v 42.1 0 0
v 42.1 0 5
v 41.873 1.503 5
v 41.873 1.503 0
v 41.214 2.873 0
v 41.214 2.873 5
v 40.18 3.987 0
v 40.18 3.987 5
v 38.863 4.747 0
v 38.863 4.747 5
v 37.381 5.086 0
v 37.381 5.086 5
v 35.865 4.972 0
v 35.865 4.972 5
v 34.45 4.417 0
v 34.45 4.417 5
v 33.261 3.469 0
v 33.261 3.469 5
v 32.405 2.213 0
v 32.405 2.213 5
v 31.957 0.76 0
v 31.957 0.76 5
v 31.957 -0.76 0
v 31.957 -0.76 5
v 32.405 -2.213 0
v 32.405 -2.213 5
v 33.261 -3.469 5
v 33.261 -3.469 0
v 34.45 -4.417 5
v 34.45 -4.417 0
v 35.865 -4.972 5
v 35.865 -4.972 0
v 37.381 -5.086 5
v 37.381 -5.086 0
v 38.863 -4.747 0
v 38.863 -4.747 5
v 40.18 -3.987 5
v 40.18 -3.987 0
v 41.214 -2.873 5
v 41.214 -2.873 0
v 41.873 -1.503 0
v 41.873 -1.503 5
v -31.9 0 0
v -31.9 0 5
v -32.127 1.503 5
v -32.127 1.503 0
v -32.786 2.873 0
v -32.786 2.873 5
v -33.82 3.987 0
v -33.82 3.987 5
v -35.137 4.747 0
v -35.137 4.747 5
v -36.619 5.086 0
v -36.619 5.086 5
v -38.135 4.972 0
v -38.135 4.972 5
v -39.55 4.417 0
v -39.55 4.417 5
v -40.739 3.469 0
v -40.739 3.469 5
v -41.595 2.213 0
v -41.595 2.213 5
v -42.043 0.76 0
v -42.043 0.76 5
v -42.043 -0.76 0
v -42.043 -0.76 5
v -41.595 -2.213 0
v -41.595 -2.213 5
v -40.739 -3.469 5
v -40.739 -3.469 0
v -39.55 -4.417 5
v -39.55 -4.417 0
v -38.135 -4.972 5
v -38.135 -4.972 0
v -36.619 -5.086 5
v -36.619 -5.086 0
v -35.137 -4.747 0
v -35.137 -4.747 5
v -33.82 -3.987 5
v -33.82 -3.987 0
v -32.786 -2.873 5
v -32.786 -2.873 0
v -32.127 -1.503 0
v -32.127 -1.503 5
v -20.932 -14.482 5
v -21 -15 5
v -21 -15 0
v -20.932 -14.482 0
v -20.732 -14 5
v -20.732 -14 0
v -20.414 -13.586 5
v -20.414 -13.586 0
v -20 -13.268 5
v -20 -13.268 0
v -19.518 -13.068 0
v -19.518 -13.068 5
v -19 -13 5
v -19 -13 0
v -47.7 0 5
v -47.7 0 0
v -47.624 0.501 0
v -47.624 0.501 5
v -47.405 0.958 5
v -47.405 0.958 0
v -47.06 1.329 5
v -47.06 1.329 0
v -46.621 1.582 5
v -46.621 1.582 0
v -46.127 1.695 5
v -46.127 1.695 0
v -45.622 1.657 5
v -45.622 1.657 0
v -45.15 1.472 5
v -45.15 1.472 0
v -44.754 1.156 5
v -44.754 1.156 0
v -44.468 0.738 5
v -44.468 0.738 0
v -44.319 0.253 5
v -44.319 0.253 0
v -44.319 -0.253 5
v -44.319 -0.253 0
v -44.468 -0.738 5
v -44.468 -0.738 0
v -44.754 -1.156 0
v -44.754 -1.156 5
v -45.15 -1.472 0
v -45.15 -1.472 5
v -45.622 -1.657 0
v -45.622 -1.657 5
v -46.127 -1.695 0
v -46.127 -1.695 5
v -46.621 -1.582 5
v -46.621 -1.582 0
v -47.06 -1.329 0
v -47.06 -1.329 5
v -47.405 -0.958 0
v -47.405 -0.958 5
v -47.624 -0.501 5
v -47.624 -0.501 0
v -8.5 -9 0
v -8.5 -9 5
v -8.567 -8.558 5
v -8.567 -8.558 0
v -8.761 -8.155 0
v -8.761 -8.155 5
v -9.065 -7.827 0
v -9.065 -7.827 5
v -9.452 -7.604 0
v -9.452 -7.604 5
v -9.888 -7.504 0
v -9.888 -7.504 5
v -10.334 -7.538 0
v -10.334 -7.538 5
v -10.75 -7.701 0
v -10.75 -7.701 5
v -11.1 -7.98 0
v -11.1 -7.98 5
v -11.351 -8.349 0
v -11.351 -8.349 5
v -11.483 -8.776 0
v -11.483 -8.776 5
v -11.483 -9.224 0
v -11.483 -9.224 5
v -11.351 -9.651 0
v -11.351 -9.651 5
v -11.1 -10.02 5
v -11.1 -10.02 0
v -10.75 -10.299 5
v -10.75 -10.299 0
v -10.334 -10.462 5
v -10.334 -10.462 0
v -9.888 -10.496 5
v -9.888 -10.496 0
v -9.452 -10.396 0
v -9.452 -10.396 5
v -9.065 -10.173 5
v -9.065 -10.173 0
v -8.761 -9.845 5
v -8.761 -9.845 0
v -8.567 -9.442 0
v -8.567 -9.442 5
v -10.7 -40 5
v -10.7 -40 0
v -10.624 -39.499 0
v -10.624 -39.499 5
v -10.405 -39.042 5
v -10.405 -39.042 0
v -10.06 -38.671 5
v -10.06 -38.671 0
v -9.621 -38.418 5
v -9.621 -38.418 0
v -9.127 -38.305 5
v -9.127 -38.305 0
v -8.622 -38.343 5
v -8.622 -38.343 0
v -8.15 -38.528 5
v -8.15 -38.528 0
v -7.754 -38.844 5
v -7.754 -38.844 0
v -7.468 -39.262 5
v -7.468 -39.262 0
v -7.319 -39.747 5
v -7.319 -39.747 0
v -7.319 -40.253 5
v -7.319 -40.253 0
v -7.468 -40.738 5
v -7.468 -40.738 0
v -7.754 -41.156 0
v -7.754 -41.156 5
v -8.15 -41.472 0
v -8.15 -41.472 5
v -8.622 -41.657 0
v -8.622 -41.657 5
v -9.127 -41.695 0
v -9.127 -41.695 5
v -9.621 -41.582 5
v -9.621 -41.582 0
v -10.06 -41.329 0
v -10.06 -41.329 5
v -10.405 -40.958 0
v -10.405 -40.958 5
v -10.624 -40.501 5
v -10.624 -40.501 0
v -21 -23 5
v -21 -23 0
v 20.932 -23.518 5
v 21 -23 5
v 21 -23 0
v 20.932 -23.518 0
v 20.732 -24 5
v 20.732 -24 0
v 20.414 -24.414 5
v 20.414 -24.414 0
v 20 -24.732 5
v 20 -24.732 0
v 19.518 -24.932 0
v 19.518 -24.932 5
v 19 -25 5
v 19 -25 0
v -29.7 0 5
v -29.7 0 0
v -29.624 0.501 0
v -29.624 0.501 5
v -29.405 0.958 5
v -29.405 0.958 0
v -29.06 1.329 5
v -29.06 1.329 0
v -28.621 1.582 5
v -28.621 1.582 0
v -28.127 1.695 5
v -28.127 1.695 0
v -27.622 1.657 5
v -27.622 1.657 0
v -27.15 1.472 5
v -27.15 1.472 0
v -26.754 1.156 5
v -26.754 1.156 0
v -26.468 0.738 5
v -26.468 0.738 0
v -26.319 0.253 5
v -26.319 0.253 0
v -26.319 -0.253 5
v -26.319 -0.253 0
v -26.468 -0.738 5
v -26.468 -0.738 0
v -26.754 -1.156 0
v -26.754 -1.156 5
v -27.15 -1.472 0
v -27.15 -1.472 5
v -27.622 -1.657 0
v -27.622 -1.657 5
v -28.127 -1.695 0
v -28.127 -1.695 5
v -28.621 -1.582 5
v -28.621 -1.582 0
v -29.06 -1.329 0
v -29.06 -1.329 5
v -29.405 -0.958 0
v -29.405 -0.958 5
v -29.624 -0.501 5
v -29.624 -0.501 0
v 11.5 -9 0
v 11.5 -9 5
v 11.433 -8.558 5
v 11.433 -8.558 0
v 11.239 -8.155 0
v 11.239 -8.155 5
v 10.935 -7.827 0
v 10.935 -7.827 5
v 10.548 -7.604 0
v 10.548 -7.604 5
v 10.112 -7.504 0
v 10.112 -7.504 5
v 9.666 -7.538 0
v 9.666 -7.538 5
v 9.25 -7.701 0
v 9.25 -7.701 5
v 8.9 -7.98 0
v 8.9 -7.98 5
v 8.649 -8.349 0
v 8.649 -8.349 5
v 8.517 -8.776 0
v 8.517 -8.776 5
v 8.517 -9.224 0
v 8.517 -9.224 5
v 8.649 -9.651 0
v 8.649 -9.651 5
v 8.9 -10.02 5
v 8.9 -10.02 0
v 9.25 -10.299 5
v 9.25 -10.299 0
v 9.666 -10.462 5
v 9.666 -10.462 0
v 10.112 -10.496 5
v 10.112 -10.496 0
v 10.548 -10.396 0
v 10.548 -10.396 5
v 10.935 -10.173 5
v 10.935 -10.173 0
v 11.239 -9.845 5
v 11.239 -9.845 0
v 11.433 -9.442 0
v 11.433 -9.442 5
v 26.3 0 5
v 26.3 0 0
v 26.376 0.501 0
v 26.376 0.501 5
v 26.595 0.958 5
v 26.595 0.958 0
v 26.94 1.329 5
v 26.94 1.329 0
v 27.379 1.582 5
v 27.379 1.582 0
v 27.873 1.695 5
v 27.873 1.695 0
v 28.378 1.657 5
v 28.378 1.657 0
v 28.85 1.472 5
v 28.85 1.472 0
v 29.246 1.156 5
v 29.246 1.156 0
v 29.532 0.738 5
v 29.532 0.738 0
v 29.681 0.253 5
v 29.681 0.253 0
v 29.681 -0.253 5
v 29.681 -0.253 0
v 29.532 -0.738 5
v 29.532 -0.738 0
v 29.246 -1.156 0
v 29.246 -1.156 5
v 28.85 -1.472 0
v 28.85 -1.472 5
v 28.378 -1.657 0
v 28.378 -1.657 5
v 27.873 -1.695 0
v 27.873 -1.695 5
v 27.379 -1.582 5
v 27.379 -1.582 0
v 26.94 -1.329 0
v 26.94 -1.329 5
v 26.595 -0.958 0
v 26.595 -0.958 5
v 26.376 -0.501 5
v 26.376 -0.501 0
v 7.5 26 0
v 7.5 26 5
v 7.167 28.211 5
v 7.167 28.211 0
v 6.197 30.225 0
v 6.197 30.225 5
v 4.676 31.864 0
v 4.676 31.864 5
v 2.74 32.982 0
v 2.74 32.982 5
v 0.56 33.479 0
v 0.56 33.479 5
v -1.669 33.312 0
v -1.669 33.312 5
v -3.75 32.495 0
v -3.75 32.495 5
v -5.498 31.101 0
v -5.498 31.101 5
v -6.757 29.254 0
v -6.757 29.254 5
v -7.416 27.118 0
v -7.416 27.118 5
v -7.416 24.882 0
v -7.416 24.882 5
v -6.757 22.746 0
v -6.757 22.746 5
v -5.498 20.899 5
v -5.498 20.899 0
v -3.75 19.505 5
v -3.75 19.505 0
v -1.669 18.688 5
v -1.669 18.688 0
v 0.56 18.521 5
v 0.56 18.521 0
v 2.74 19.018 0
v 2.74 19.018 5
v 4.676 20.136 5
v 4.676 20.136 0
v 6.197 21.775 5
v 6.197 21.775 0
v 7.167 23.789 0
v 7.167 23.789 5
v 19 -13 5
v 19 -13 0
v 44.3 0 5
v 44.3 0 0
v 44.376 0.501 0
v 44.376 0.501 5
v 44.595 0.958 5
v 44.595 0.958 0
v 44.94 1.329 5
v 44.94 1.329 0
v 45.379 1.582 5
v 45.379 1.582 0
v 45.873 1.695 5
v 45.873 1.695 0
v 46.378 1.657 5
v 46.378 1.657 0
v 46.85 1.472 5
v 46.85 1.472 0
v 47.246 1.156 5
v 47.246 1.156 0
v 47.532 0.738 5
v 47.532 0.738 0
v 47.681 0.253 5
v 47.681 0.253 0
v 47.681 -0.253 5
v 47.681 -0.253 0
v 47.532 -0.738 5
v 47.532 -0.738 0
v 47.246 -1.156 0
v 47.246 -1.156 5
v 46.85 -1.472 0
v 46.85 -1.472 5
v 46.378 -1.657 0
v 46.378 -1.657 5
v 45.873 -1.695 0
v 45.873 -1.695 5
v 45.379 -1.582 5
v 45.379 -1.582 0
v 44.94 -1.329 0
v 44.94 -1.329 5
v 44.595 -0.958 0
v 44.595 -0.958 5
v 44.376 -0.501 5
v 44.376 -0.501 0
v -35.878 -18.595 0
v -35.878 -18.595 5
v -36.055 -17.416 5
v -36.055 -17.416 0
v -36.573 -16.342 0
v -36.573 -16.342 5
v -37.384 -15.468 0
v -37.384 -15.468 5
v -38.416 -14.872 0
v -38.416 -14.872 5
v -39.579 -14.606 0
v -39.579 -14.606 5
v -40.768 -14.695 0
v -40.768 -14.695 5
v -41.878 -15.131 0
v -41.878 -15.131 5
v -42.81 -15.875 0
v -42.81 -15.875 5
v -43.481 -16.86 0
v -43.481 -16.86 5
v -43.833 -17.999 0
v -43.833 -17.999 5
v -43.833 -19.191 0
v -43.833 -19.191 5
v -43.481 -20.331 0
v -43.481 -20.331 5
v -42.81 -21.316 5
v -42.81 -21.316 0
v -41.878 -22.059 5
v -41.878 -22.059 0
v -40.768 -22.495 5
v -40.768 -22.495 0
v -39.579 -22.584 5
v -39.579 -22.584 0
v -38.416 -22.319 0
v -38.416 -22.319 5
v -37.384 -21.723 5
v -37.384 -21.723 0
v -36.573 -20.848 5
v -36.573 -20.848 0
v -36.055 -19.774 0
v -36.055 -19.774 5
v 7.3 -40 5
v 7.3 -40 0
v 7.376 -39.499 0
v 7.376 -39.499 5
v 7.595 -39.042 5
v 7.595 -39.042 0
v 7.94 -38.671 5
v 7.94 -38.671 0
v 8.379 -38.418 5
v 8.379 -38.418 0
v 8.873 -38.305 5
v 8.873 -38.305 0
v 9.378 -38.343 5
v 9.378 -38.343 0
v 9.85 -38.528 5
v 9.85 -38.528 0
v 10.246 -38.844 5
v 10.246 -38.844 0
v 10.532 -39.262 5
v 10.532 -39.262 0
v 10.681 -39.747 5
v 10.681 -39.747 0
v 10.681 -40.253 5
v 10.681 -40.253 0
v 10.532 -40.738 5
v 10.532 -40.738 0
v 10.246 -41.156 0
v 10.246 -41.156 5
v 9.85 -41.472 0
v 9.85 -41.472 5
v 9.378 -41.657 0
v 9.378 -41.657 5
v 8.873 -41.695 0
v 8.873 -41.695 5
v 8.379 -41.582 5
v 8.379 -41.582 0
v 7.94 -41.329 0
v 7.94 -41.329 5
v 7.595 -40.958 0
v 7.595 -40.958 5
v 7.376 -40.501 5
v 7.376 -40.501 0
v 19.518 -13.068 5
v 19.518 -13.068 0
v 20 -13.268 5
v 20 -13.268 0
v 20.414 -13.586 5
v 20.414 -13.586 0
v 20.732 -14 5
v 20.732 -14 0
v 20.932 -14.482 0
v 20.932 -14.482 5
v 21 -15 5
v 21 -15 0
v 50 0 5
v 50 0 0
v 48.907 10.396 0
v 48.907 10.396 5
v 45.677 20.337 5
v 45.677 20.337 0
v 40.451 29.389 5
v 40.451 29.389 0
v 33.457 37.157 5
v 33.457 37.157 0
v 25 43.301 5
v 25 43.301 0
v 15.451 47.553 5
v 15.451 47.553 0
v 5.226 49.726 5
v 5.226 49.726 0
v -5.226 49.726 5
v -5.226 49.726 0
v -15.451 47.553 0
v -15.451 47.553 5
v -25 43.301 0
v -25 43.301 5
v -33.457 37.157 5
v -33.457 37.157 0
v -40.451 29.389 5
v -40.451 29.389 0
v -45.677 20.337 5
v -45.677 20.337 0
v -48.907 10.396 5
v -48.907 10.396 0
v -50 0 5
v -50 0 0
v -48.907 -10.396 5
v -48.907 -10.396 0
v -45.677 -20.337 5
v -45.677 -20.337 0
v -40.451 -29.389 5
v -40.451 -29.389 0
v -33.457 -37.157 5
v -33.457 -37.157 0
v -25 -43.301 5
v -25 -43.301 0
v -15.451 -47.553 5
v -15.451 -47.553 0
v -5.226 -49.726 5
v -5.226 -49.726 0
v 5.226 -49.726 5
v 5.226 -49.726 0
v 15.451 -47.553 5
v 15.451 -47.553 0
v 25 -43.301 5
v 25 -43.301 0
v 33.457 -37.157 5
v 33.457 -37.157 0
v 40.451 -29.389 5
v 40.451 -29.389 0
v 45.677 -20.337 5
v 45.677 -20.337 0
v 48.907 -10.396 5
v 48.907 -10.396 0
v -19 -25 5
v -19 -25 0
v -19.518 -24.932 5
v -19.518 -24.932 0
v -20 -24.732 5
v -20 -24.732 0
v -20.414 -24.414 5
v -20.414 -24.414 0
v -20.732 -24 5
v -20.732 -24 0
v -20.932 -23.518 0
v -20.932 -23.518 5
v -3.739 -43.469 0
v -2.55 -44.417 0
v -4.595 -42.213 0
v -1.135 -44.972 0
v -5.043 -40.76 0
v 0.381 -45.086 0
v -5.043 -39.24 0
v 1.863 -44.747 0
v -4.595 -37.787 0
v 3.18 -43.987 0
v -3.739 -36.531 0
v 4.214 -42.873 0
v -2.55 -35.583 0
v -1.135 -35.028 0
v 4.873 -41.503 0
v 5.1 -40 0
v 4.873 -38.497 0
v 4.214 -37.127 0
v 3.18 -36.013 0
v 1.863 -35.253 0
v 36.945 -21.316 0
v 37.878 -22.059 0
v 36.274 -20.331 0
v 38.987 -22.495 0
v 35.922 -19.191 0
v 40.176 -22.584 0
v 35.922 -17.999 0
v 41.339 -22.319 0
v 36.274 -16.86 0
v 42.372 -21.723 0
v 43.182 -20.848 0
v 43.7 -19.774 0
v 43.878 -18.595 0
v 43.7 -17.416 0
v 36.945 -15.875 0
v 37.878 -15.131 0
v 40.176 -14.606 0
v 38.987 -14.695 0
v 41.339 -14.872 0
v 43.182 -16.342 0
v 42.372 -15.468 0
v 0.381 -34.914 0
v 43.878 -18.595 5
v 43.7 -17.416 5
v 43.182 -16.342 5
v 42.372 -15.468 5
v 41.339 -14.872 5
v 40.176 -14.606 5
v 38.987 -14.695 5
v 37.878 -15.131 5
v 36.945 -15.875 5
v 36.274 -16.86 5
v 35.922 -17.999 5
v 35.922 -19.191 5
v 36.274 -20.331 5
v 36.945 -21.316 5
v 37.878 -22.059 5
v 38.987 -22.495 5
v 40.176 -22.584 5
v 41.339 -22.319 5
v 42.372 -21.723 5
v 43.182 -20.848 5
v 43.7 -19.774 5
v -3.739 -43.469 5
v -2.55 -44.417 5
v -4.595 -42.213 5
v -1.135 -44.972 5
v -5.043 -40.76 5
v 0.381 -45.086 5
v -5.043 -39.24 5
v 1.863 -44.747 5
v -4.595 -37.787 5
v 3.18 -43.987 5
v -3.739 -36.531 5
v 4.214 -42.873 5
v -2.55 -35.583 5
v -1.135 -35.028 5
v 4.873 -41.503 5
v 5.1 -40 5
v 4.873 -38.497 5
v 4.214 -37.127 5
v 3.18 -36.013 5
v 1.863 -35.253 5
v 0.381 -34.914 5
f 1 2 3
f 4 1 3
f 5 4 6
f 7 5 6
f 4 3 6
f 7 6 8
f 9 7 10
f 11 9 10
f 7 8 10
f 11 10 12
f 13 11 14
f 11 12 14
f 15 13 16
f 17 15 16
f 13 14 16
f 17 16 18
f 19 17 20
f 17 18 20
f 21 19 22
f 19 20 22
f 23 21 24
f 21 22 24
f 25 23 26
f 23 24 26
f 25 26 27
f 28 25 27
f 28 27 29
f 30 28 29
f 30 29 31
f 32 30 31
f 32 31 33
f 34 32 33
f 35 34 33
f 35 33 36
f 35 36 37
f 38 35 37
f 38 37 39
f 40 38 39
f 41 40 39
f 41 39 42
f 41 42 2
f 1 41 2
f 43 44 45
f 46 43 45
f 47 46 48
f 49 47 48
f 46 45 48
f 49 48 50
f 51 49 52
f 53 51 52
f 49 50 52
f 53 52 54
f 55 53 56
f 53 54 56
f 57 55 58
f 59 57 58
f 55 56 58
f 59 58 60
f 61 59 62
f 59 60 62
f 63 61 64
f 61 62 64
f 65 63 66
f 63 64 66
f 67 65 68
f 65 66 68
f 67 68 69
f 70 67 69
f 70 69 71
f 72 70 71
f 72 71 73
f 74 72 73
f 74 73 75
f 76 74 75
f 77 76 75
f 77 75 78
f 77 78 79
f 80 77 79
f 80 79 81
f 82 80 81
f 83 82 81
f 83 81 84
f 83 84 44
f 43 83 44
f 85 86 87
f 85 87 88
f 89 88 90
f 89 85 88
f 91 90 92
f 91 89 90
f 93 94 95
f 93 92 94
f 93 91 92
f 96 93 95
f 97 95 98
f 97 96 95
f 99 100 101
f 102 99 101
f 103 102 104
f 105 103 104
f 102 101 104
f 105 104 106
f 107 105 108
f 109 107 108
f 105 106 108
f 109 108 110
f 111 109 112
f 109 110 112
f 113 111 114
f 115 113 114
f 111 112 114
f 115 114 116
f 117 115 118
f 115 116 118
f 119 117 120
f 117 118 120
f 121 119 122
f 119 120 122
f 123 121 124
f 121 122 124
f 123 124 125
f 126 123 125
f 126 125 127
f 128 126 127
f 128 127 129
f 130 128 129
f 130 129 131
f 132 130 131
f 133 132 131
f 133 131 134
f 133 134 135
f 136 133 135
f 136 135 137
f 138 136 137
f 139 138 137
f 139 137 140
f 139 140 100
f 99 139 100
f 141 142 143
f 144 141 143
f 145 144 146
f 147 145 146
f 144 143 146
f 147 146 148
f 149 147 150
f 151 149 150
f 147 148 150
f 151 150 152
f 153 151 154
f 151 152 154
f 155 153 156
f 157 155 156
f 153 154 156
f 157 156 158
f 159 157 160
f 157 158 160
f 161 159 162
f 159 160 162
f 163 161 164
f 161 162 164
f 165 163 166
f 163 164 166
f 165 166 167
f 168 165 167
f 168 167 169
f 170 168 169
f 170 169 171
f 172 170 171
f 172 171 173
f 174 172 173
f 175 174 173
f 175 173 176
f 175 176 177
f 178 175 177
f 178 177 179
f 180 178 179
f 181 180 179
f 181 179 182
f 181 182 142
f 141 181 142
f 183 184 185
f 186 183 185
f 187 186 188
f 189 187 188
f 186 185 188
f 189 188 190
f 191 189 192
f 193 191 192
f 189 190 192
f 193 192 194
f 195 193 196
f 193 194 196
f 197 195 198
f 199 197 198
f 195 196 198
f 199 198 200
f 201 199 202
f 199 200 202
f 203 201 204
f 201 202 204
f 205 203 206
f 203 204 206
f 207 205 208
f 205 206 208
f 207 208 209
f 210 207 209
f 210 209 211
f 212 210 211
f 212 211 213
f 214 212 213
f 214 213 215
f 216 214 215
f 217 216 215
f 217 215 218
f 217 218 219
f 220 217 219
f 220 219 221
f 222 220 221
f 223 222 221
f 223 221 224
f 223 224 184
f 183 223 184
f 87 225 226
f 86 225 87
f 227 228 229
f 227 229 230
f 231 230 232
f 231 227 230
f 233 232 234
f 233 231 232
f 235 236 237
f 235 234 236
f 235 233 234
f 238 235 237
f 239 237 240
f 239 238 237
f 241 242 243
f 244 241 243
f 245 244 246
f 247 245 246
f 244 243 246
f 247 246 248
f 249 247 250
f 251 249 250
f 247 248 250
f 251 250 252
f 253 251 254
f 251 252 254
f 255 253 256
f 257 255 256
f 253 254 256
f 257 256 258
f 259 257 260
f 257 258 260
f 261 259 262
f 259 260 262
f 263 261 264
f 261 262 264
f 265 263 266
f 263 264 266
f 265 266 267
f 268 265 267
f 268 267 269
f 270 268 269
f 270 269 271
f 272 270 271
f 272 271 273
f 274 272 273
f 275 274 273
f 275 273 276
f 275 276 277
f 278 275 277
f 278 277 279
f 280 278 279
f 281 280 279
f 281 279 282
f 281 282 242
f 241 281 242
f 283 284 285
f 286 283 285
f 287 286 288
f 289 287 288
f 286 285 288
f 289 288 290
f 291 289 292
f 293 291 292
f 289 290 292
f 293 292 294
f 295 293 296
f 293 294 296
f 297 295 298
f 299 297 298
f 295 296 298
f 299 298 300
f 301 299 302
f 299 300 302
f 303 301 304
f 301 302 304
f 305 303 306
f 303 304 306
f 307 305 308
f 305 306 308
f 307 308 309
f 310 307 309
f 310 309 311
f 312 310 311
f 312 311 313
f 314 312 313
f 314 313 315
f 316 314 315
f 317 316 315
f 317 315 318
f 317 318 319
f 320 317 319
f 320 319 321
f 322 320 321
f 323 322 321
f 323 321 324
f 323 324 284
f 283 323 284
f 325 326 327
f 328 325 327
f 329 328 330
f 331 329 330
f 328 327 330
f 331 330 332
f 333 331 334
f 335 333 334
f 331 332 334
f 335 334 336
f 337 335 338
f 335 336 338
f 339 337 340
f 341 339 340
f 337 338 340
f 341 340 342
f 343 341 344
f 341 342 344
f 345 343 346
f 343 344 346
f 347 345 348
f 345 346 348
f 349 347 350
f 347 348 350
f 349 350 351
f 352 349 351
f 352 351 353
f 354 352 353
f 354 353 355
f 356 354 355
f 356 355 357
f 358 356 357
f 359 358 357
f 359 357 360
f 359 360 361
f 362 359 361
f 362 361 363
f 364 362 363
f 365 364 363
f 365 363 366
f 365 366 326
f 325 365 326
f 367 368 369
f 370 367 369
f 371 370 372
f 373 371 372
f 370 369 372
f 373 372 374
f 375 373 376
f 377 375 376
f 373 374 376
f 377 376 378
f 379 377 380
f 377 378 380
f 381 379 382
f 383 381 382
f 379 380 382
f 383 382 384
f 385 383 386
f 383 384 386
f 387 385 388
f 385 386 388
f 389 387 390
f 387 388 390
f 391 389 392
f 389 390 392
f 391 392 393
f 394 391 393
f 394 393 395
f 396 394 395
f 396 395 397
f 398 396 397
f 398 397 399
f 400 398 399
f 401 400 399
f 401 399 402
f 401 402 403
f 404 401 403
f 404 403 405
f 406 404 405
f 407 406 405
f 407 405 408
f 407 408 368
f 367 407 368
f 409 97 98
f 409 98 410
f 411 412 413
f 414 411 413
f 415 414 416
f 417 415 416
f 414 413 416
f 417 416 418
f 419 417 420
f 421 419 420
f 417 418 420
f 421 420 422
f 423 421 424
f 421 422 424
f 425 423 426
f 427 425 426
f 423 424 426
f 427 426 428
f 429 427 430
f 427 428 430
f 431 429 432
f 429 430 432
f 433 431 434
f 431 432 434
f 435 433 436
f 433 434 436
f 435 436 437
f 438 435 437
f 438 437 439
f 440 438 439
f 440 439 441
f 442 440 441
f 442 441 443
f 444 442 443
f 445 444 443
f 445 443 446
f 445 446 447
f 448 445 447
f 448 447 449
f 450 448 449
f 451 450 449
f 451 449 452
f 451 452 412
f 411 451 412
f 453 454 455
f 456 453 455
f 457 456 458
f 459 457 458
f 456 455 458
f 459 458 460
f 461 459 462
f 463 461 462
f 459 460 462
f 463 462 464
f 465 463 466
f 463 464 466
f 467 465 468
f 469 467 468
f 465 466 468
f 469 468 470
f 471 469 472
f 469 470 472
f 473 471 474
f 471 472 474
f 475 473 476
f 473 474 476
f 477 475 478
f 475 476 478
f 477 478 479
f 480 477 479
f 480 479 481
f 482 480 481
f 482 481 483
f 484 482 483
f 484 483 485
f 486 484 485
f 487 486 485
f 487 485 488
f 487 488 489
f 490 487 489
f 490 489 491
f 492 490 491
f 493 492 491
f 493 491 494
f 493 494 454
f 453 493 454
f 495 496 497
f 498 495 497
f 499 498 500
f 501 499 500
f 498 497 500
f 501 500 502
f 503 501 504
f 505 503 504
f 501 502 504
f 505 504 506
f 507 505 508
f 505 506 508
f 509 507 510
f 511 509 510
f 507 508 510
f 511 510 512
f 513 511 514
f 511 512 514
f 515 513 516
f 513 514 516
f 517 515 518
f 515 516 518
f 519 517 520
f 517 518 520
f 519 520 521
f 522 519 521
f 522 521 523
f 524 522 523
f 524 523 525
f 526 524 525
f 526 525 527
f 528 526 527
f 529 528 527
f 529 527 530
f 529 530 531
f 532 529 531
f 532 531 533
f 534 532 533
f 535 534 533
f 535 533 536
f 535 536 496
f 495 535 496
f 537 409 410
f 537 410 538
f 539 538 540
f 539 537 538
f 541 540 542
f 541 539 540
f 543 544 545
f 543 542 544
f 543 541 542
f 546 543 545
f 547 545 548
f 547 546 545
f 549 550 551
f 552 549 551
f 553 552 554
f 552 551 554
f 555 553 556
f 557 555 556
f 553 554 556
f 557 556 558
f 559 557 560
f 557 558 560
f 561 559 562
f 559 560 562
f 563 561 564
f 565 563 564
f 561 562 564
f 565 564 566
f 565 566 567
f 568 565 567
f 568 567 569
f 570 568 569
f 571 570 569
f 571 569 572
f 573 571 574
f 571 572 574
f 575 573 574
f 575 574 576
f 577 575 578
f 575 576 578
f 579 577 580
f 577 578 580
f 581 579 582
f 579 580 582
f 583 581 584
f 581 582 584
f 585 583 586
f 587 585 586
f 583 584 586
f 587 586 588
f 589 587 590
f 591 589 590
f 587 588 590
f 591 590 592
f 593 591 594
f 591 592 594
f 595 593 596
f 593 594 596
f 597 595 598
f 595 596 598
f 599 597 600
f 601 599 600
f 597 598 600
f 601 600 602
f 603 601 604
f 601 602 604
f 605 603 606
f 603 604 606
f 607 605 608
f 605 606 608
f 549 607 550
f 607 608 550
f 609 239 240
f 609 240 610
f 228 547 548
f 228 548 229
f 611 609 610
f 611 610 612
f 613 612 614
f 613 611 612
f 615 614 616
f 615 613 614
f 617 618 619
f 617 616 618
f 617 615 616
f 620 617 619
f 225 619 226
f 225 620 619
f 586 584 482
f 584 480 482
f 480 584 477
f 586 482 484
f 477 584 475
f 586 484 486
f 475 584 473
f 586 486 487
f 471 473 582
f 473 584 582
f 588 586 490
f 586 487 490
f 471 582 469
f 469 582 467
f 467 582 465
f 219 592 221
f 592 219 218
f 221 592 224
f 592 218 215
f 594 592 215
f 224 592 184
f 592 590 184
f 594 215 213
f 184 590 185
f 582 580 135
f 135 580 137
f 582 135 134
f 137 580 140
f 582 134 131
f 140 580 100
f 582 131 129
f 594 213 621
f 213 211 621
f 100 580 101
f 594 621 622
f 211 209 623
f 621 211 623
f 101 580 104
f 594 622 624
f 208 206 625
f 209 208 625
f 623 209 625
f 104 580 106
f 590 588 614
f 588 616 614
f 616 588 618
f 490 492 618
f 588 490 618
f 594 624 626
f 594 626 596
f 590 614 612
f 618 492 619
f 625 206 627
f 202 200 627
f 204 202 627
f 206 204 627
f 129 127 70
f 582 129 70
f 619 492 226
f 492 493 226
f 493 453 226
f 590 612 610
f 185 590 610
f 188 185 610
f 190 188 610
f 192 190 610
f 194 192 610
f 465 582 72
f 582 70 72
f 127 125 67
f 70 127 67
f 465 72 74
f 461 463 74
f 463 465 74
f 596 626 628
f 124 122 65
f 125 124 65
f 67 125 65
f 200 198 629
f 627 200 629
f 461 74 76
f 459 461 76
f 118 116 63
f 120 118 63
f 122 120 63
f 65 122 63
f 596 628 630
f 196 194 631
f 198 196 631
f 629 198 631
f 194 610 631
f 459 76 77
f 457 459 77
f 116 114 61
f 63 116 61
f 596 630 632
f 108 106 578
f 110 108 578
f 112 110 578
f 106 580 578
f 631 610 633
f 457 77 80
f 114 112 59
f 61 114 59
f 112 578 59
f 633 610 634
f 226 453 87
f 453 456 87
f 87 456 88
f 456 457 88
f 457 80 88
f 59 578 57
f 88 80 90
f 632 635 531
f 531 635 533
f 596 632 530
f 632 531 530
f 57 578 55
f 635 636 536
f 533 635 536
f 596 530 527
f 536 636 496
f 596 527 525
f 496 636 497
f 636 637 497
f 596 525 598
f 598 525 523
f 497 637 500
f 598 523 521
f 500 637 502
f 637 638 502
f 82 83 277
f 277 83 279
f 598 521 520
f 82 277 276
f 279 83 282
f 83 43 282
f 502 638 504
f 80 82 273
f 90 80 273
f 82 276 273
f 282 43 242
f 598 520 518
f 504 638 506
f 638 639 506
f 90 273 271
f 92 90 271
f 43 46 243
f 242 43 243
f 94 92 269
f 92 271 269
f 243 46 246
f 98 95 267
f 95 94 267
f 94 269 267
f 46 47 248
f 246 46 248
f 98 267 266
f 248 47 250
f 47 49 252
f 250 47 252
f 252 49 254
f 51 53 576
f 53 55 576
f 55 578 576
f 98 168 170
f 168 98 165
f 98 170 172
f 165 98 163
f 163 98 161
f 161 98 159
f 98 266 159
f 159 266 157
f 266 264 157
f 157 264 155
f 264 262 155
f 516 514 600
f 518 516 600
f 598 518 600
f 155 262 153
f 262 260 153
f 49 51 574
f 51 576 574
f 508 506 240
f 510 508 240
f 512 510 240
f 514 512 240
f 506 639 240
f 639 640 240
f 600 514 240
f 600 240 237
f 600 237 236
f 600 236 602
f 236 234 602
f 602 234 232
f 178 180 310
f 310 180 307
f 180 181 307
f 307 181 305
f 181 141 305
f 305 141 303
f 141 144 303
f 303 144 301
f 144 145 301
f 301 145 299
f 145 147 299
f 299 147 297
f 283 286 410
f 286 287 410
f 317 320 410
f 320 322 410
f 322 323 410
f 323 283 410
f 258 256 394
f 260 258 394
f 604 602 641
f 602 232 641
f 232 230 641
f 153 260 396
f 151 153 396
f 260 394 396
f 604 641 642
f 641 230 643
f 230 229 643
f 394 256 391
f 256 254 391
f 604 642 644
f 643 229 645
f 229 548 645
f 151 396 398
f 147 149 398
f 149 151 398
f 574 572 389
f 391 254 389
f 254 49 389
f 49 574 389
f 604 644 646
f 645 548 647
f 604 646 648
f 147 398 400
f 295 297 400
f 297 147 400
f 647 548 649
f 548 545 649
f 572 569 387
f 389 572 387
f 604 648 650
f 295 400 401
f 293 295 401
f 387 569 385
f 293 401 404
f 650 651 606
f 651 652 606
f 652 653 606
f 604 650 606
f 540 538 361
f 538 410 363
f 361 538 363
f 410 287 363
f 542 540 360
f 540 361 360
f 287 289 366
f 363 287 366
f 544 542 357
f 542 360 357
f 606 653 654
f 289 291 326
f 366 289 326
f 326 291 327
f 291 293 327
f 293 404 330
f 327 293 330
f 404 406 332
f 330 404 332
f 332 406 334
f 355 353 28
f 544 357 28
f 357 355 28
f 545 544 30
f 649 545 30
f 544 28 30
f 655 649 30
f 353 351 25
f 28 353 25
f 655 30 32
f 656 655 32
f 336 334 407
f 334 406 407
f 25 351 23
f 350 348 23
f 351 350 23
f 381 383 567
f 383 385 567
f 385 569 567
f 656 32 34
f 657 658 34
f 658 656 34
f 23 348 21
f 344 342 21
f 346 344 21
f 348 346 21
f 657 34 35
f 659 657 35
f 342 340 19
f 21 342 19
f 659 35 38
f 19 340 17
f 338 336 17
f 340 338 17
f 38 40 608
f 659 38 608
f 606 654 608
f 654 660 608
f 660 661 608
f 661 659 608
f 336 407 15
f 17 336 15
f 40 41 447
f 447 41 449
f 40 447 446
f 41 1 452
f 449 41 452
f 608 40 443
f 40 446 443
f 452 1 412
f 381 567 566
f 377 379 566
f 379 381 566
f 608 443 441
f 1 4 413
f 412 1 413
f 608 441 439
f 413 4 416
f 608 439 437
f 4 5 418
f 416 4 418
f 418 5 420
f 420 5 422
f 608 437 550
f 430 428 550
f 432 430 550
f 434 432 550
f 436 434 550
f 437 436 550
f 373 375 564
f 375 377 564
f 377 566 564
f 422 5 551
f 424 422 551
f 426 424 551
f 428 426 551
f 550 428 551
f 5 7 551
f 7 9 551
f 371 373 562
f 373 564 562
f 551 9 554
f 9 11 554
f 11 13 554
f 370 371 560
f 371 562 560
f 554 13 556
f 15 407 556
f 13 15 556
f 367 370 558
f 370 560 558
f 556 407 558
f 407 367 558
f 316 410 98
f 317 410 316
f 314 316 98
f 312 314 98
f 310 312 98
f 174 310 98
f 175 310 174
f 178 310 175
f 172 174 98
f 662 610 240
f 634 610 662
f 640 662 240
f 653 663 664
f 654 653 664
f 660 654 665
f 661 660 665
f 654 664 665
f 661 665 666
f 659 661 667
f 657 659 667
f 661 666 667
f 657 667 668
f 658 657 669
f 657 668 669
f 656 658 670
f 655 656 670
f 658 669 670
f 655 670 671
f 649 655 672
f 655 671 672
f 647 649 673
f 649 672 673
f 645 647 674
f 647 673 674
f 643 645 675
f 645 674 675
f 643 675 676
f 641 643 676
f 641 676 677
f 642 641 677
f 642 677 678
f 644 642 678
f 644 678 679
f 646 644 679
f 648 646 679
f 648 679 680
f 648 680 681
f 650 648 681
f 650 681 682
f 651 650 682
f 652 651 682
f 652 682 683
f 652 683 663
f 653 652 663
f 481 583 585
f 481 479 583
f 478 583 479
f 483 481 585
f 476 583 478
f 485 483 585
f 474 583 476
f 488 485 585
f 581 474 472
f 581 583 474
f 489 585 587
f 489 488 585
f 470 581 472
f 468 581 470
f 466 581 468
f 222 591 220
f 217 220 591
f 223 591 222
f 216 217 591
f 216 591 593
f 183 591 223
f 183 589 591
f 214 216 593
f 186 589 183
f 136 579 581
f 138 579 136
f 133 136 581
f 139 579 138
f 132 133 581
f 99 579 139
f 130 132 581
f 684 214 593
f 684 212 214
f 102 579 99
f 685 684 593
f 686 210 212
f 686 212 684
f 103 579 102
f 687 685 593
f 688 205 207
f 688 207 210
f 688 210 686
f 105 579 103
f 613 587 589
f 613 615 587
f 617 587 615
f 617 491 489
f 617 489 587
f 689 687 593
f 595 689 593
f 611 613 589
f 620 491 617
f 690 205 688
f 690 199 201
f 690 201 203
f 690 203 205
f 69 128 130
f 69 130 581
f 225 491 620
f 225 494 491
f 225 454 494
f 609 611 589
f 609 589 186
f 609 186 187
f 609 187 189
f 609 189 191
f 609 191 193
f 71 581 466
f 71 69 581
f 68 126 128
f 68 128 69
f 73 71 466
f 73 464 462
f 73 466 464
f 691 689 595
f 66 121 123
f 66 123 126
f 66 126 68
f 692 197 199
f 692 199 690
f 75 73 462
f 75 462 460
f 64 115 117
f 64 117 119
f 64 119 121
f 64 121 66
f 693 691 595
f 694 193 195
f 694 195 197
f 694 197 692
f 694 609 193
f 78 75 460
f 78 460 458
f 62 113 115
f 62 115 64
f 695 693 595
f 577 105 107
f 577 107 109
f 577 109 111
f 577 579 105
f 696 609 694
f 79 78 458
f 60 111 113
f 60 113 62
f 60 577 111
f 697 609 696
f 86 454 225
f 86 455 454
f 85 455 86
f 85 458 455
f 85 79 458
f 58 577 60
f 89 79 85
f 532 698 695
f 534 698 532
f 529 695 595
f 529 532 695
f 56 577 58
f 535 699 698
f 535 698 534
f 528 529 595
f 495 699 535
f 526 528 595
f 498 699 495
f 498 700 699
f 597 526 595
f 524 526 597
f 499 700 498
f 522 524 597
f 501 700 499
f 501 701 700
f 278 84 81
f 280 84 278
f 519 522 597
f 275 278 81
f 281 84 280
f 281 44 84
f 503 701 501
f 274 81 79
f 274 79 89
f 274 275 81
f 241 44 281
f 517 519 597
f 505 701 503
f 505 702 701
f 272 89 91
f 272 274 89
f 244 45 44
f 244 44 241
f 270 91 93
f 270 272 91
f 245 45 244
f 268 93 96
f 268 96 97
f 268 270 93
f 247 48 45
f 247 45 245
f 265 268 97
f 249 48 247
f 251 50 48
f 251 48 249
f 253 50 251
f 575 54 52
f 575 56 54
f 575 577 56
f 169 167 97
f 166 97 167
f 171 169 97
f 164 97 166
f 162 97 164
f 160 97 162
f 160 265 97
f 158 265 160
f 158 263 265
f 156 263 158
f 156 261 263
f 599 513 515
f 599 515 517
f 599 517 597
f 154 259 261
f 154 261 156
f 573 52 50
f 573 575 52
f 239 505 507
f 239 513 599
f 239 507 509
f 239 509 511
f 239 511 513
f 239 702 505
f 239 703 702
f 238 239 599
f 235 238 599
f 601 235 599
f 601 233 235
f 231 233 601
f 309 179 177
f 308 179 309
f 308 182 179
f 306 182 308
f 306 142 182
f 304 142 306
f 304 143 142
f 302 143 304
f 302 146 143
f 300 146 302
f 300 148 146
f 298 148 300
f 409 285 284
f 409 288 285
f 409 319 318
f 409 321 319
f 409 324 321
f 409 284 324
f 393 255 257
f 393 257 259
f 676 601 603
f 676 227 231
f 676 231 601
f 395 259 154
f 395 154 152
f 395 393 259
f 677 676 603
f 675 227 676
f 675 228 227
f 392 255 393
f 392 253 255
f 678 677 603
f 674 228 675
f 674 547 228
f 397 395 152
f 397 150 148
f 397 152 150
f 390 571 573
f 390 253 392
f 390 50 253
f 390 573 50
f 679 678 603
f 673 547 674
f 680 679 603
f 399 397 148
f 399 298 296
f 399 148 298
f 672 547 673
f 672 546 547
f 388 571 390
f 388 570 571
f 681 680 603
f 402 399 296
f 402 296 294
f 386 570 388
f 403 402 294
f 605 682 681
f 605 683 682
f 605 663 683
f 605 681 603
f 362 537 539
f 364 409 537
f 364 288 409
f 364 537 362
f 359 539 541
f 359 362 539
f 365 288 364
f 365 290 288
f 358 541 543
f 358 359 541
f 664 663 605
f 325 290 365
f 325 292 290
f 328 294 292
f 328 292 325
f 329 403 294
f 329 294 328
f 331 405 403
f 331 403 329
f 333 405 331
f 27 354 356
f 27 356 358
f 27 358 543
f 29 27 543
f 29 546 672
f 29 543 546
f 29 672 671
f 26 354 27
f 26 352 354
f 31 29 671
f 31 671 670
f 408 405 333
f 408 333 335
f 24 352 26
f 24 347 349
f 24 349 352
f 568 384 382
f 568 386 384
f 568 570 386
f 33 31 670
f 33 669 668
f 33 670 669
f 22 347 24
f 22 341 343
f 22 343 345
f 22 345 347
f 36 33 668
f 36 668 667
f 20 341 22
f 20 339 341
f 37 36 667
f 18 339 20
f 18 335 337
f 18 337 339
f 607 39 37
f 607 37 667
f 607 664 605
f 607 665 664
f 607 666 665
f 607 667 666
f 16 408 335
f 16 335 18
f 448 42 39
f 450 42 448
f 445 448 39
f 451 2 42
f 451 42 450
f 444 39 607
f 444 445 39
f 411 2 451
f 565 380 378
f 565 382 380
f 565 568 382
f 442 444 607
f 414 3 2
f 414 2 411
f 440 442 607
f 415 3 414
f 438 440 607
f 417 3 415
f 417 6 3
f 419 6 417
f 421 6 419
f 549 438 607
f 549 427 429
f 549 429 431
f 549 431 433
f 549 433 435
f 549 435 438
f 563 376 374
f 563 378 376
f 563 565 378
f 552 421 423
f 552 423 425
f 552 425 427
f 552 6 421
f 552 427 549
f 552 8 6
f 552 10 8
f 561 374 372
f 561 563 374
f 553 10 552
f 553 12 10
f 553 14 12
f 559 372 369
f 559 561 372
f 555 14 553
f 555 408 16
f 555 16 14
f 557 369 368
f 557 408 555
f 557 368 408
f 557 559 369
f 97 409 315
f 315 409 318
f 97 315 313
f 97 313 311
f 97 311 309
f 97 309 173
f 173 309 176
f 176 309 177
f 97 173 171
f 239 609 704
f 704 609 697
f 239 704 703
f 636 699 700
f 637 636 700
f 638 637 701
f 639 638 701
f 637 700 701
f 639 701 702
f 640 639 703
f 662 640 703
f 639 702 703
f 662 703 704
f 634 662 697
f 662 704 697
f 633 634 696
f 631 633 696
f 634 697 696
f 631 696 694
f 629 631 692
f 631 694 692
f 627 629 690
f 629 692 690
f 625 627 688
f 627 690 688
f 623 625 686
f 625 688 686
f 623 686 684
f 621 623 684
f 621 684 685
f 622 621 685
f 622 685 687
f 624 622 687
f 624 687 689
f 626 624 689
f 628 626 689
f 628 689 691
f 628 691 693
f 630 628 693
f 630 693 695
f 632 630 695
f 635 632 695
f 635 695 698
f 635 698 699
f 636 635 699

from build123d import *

# Parameters (mm, degrees)
SKETCH1_R                    = 50
BOSS_EXTRUDE1_DEPTH          = 5
F_10_2_10_2_DIAMETER_HOLE1_D = 10.2
M3_CLEARANCE_HOLE1_D         = 3.4
SKETCH9_R                    = 7.5
CUT_EXTRUDE1_DEPTH           = 10
SKETCH10_R                   = 1.5
CUT_EXTRUDE2_DEPTH           = 10
SKETCH11_R                   = 4
CUT_EXTRUDE3_DEPTH           = 10


with BuildPart() as part:
    # Sketch1 → Boss-Extrude1 (new body)
    with BuildSketch(Plane.XY):
        Circle(SKETCH1_R)
    extrude(amount=BOSS_EXTRUDE1_DEPTH)

    # Ø10.2 (10.2) Diameter Hole1 (through all)
    with Locations(Plane(origin=(0, 0, 0), x_dir=(-1, 0, 0), z_dir=(0, 0, -1))):
        with Locations((37, 0), (-37, 0), (0, -40)):
            Hole(F_10_2_10_2_DIAMETER_HOLE1_D / 2)

    # M3 Clearance Hole1 (through all)
    with Locations(Plane.XY.offset(5)):
        with Locations((46, 0), (28, 0), (9, -40), (-9, -40), (-46, 0), (-28, 0)):
            Hole(M3_CLEARANCE_HOLE1_D / 2)

    # Sketch9 → Cut-Extrude1 (cut)
    with BuildSketch(Plane.XY.offset(5)):
        with Locations((0, 26)):
            Circle(SKETCH9_R)
    extrude(amount=-CUT_EXTRUDE1_DEPTH, mode=Mode.SUBTRACT)

    # Sketch10 → Cut-Extrude2 (cut)
    with BuildSketch(Plane.XY.offset(5)):
        with Locations((10, -9)):
            Circle(SKETCH10_R)
        with Locations((-10, -9)):
            Circle(SKETCH10_R)
        with BuildLine():
            Line((-19, -13), (19, -13))
            ThreePointArc((19, -13), (20.414213562, -13.585786438), (21, -15))
            Line((21, -15), (21, -23))
            ThreePointArc((21, -23), (20.414213562, -24.414213562), (19, -25))
            Line((19, -25), (-19, -25))
            ThreePointArc((-19, -25), (-20.414213562, -24.414213562), (-21, -23))
            Line((-21, -23), (-21, -15))
            ThreePointArc((-21, -15), (-20.414213562, -13.585786438), (-19, -13))
        make_face()
    extrude(amount=-CUT_EXTRUDE2_DEPTH, mode=Mode.SUBTRACT)

    # Sketch11 → Cut-Extrude3 (cut)
    with BuildSketch(Plane.XY.offset(5)):
        with Locations((-39.87754263, -18.595203517)):
            Circle(SKETCH11_R)
        with Locations((39.87754263, -18.595203517)):
            Circle(SKETCH11_R)
    extrude(amount=-CUT_EXTRUDE3_DEPTH, mode=Mode.SUBTRACT)


solid = part.part
